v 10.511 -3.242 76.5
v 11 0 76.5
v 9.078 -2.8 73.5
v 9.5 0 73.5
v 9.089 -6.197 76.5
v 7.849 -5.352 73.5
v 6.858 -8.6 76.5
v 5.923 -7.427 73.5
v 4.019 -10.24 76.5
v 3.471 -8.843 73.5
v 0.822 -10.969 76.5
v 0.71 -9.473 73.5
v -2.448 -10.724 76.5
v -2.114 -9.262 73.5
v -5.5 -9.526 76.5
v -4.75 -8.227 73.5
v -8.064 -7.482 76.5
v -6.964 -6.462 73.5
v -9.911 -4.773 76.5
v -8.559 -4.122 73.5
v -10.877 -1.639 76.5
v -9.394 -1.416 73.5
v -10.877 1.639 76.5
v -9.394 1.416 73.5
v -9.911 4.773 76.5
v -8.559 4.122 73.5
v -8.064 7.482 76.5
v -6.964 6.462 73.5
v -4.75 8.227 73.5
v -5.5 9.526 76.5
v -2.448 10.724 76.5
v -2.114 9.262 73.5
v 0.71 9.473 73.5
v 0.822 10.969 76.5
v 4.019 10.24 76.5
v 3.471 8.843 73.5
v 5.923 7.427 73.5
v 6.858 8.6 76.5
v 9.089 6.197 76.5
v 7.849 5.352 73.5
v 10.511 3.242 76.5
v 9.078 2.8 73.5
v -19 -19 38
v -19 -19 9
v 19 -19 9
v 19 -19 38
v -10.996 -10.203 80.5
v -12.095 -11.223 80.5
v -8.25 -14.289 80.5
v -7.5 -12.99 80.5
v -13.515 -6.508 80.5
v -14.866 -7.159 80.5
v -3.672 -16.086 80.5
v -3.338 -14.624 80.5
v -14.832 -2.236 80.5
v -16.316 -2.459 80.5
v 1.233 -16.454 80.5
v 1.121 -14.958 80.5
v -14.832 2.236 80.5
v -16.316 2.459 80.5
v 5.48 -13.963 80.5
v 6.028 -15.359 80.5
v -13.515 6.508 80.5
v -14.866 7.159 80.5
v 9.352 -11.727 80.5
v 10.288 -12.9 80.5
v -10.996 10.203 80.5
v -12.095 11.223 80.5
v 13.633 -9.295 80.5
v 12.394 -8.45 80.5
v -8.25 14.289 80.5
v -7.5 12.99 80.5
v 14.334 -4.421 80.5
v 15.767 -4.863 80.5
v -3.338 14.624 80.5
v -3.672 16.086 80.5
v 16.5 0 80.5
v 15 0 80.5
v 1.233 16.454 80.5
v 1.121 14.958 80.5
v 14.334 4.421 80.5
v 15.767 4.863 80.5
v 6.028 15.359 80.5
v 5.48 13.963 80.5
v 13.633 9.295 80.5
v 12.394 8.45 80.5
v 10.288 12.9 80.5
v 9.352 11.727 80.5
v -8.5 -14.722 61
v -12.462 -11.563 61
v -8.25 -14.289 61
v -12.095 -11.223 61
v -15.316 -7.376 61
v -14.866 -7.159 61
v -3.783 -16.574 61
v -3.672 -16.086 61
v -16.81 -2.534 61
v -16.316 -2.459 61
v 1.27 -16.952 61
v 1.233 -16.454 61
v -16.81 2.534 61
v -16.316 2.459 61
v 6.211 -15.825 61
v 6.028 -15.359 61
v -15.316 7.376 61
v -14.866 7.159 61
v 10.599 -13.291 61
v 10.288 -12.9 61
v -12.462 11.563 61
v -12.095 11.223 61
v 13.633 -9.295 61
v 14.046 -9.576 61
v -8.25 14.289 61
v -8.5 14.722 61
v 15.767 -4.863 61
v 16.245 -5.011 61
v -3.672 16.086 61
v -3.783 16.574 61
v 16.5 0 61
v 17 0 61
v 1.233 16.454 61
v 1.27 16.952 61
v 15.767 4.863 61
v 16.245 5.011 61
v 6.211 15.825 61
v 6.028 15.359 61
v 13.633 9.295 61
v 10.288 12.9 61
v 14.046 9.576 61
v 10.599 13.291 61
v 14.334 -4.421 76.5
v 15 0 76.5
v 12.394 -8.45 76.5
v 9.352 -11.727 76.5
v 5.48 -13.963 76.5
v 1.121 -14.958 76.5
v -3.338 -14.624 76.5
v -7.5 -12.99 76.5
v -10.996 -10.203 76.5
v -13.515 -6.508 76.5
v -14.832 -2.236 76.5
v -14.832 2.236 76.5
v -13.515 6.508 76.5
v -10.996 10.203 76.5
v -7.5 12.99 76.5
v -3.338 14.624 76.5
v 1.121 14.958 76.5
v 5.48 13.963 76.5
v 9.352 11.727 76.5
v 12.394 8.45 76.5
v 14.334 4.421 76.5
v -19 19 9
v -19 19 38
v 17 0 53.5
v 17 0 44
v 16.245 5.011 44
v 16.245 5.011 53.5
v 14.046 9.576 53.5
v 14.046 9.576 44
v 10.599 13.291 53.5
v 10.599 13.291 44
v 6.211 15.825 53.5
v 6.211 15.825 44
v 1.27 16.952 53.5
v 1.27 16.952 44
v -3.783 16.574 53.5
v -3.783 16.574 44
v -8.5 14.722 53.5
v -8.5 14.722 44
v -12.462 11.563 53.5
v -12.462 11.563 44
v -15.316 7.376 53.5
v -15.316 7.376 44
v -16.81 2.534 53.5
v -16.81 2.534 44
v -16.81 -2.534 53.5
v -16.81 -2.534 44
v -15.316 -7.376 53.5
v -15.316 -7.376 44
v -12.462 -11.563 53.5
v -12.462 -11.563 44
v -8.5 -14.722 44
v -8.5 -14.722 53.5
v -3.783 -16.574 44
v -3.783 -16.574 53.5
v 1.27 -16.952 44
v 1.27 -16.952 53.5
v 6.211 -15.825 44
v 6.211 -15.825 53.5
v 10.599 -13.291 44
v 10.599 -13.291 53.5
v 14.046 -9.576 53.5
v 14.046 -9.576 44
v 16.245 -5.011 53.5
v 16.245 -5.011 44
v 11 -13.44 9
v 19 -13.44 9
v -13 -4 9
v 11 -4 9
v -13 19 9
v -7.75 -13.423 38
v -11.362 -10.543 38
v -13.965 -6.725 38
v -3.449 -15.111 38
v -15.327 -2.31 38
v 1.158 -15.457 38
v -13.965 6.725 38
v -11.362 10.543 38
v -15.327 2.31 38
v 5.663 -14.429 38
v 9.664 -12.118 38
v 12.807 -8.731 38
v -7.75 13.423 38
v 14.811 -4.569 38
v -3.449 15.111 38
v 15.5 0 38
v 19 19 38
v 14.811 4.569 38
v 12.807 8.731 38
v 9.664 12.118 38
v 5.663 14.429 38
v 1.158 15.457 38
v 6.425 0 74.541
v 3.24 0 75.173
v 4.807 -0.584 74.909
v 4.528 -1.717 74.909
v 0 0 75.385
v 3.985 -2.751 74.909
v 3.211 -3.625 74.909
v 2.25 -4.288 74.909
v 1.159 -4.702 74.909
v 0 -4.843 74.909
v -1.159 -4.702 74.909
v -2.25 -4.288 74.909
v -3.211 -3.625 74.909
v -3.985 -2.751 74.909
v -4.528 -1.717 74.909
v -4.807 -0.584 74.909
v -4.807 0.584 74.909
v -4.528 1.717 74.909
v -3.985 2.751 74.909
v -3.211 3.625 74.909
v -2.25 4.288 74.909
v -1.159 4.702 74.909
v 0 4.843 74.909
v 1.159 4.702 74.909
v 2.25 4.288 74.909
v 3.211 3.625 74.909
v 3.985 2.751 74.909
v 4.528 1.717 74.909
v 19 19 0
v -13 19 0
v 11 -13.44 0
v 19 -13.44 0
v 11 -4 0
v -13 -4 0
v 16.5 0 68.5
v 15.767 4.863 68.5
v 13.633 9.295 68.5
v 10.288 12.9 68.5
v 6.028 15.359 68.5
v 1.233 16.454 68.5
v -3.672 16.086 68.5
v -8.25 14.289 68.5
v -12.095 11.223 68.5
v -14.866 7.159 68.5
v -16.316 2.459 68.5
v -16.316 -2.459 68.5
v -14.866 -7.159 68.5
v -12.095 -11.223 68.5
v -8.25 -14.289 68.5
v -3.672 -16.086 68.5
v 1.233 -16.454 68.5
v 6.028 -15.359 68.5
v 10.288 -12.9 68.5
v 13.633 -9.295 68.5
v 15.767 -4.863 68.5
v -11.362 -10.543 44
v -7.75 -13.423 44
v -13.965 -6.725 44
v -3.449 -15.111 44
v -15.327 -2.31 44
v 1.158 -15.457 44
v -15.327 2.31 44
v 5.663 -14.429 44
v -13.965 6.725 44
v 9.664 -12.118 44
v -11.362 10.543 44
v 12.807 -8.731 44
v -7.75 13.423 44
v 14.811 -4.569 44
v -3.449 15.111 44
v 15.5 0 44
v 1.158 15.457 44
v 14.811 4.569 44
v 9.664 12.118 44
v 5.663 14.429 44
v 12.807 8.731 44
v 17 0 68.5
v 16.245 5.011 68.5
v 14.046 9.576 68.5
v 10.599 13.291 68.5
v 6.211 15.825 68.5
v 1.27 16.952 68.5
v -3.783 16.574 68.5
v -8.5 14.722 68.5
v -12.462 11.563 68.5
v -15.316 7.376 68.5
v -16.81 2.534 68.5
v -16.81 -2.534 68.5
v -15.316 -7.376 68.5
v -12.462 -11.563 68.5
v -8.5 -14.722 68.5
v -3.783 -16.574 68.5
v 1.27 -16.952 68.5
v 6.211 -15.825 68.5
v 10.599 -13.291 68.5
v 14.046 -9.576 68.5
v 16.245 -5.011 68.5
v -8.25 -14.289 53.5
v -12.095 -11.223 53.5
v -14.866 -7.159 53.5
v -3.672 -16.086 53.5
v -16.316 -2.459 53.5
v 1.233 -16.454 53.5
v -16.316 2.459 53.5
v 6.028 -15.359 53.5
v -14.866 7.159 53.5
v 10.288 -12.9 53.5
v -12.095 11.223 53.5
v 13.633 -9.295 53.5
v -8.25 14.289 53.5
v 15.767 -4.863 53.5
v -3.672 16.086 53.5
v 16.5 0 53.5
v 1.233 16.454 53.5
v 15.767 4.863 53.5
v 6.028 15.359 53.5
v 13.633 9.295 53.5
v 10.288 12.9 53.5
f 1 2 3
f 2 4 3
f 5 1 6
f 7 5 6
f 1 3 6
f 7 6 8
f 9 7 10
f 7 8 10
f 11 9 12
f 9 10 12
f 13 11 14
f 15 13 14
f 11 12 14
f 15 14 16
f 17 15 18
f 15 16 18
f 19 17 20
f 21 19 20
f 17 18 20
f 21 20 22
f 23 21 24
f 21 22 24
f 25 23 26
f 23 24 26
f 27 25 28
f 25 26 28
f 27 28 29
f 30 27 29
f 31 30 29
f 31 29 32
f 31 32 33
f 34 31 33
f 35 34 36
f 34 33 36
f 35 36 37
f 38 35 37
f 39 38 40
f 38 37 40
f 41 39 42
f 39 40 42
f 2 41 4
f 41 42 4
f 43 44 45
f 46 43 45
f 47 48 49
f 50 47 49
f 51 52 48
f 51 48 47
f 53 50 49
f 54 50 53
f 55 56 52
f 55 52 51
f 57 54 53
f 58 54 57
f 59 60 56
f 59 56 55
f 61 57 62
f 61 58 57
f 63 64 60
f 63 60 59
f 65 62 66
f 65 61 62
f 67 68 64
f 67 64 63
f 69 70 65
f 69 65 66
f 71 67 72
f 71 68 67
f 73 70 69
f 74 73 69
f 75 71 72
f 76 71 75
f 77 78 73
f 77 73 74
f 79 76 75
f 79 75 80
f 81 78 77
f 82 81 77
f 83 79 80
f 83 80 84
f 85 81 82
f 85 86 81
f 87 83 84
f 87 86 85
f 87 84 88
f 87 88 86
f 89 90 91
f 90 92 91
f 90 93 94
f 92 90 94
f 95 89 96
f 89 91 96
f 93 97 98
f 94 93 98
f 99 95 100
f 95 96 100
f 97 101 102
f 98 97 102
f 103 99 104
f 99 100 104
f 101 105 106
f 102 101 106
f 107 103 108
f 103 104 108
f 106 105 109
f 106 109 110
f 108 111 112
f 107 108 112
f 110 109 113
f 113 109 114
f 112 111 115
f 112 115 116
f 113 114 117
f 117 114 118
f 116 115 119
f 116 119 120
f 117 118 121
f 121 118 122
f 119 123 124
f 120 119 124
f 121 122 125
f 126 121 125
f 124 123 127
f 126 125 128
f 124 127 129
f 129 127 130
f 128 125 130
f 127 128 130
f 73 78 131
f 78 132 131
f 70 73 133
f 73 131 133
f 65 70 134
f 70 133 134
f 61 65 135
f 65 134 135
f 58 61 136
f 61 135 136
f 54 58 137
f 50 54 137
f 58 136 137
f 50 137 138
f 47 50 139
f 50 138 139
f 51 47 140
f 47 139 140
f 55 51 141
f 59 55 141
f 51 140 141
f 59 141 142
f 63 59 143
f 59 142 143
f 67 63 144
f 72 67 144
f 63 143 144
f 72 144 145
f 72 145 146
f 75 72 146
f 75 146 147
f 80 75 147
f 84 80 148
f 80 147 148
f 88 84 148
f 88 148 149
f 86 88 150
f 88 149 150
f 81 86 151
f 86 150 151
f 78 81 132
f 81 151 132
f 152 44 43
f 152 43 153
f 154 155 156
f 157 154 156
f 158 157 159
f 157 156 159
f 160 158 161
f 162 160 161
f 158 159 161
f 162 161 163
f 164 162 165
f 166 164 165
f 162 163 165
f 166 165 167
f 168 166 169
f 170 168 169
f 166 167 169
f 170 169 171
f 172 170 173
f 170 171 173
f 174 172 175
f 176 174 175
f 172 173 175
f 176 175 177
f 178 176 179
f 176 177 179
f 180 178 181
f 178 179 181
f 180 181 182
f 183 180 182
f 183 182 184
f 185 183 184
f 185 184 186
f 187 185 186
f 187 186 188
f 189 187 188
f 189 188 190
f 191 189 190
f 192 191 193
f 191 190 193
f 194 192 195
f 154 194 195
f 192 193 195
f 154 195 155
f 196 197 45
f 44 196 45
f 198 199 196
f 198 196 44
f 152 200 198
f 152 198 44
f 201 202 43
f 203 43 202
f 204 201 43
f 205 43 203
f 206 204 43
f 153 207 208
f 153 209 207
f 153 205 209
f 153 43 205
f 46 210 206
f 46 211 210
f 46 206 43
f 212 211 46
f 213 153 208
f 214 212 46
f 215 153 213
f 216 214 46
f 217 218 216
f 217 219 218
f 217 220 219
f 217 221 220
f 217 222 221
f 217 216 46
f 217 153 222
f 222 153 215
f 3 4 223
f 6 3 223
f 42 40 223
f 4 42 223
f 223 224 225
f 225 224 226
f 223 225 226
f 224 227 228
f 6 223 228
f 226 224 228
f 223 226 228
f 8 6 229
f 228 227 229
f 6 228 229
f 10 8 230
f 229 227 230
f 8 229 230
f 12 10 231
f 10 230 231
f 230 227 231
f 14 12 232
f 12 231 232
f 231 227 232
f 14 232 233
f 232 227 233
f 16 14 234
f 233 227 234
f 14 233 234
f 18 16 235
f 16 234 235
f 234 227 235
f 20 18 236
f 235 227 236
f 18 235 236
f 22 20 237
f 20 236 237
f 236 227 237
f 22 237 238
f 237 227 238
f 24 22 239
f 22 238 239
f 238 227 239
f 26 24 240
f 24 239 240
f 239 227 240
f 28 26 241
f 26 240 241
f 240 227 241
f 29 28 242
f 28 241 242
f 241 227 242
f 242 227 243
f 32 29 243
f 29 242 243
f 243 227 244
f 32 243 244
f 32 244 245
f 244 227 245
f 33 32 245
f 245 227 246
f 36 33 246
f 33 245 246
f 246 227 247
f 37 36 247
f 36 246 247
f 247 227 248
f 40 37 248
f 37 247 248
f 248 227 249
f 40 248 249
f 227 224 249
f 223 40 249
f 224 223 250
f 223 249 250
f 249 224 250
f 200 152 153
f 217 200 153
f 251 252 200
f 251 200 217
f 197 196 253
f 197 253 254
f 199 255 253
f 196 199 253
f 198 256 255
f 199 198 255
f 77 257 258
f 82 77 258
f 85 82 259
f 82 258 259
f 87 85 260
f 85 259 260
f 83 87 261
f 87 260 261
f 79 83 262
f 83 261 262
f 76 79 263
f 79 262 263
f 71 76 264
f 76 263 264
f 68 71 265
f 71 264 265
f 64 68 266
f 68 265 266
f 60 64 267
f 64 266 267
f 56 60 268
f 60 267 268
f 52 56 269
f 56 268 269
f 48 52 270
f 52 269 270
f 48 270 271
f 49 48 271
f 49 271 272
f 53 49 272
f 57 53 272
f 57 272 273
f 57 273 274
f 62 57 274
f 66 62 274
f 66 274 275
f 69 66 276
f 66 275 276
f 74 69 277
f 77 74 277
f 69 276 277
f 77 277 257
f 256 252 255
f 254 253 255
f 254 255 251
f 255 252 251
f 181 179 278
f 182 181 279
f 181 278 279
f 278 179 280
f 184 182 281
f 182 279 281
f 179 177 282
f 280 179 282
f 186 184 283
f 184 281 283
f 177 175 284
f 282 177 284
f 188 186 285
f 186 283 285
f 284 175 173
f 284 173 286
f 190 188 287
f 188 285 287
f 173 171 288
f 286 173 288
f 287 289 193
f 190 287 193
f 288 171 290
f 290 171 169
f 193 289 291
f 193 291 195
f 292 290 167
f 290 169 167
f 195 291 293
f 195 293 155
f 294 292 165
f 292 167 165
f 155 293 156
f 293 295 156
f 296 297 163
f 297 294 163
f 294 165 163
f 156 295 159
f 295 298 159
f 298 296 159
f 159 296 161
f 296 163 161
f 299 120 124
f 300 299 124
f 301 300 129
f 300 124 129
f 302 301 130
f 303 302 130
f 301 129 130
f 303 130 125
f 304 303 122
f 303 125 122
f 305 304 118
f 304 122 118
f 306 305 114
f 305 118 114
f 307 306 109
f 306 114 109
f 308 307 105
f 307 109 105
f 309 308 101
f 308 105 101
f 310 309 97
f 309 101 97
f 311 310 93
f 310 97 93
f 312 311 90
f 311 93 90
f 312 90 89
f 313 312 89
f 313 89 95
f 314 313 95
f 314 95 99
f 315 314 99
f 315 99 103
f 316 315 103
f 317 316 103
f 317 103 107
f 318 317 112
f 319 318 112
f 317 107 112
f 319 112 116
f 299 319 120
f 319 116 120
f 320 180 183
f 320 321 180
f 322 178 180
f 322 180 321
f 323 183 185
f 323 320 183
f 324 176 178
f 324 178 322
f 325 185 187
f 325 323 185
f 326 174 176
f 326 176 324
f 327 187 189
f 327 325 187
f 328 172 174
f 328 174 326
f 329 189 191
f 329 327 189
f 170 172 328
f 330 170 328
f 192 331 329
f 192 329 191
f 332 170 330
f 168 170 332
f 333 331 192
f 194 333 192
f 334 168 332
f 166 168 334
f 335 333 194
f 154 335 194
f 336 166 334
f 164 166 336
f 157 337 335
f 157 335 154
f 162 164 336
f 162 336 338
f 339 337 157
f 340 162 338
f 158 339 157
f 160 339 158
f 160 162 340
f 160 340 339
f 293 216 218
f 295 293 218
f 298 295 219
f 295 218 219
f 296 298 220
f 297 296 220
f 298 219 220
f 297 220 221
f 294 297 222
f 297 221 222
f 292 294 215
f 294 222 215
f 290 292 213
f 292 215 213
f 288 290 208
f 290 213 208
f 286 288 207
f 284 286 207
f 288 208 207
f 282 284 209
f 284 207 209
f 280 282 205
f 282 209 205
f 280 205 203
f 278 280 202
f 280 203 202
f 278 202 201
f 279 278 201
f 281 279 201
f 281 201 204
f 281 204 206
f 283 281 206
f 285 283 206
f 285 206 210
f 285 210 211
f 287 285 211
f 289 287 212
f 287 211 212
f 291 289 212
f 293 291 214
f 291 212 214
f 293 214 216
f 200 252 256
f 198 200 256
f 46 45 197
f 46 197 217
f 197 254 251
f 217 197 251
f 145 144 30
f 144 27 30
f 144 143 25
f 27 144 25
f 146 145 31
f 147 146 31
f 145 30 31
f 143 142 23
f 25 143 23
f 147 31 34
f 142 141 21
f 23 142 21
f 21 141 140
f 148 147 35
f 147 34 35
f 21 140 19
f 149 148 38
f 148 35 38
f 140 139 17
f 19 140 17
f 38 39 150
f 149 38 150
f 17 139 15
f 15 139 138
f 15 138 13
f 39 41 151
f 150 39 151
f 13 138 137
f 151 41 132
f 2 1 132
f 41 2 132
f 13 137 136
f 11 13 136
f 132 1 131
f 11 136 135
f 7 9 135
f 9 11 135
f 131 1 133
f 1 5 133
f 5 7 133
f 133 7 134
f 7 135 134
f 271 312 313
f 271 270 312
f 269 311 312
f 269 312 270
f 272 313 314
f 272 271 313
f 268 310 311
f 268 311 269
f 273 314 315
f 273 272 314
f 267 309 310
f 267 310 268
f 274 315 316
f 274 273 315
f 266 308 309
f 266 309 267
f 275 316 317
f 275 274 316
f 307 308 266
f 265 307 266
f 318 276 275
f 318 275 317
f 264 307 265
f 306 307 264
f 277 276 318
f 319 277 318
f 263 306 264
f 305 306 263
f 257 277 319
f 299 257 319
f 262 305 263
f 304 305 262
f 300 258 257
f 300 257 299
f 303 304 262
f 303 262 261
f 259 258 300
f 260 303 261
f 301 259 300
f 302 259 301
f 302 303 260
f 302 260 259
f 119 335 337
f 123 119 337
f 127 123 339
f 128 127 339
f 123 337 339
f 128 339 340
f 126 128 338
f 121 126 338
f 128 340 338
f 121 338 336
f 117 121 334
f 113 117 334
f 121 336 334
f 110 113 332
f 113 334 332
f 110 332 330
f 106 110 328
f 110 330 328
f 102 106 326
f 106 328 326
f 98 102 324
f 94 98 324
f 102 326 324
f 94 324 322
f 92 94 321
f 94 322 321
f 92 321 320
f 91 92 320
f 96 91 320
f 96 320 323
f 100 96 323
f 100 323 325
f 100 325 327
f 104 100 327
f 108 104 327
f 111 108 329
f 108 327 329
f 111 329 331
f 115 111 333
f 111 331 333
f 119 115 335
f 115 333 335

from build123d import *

# Parameters (mm, degrees)
SKETCH_1_W          = 38
SKETCH_1_H          = 38
EXTRUDE_1_DEPTH     = 38
SKETCH_2_R          = 15.5
EXTRUDE_2_DEPTH     = 6
SKETCH_3_R          = 17
EXTRUDE_3_DEPTH     = 9.5
SKETCH_4_R          = 16.5
EXTRUDE_4_DEPTH     = 7.5
SKETCH_5_R          = 17
EXTRUDE_5_DEPTH     = 7.5
SKETCH_6_R          = 16.5
EXTRUDE_6_DEPTH     = 12
CUT_EXTRUDE_1_DEPTH = 9


with BuildPart() as part:
    # 草图1 → 拉伸1 (new body)
    with BuildSketch(Plane.XY):
        Rectangle(SKETCH_1_W, SKETCH_1_H)
    extrude(amount=EXTRUDE_1_DEPTH)

    # 草图2 → 拉伸2 (add)
    with BuildSketch(Plane.XY.offset(38)):
        Circle(SKETCH_2_R)
    extrude(amount=EXTRUDE_2_DEPTH)

    # 草图3 → 拉伸3 (add)
    with BuildSketch(Plane.XY.offset(44)):
        Circle(SKETCH_3_R)
    extrude(amount=EXTRUDE_3_DEPTH)

    # 草图4 → 拉伸4 (add)
    with BuildSketch(Plane.XY.offset(53.5)):
        Circle(SKETCH_4_R)
    extrude(amount=EXTRUDE_4_DEPTH)

    # 草图5 → 拉伸5 (add)
    with BuildSketch(Plane.XY.offset(61)):
        Circle(SKETCH_5_R)
    extrude(amount=EXTRUDE_5_DEPTH)

    # 草图6 → 拉伸6 (add)
    with BuildSketch(Plane.XY.offset(68.5)):
        Circle(SKETCH_6_R)
    extrude(amount=EXTRUDE_6_DEPTH)

    # 草图8 → 切除-旋转1 (revolve, cut)
    with BuildSketch(Plane(origin=(0, 0, 0), x_dir=(1, 0, 0), z_dir=(0, 1, 0)), mode=Mode.PRIVATE) as cut_revolve_1_sk:
        with BuildLine():
            Line((0, -80.5), (-15, -80.5))
            Line((-15, -80.5), (-15, -76.5))
            Line((-15, -76.5), (-11, -76.5))
            Line((-11, -76.5), (-9.5, -73.5))
            ThreePointArc((-9.5, -73.5), (-4.842577395, -74.909003343), (0, -75.384734276))
            Line((0, -75.384734276), (0, -80.5))
        make_face()
    revolve(cut_revolve_1_sk.sketch.rotate(Axis((0, 0, 1080.5), (0, 0, -1)), 180), axis=Axis((0, 0, 1080.5), (0, 0, -1)), mode=Mode.SUBTRACT)

    # 草图9 → 切除-拉伸1 (cut)
    with BuildSketch(Plane(origin=(0, 0, 0), x_dir=(-1, 0, 0), z_dir=(0, 0, -1))):
        Polygon((-19, -19), (19, -19), (19, 19), (13, 19), (13, -4), (-11, -4), (-11, -13.44), (-19, -13.44), align=None)
    extrude(amount=-CUT_EXTRUDE_1_DEPTH, mode=Mode.SUBTRACT)


solid = part.part
